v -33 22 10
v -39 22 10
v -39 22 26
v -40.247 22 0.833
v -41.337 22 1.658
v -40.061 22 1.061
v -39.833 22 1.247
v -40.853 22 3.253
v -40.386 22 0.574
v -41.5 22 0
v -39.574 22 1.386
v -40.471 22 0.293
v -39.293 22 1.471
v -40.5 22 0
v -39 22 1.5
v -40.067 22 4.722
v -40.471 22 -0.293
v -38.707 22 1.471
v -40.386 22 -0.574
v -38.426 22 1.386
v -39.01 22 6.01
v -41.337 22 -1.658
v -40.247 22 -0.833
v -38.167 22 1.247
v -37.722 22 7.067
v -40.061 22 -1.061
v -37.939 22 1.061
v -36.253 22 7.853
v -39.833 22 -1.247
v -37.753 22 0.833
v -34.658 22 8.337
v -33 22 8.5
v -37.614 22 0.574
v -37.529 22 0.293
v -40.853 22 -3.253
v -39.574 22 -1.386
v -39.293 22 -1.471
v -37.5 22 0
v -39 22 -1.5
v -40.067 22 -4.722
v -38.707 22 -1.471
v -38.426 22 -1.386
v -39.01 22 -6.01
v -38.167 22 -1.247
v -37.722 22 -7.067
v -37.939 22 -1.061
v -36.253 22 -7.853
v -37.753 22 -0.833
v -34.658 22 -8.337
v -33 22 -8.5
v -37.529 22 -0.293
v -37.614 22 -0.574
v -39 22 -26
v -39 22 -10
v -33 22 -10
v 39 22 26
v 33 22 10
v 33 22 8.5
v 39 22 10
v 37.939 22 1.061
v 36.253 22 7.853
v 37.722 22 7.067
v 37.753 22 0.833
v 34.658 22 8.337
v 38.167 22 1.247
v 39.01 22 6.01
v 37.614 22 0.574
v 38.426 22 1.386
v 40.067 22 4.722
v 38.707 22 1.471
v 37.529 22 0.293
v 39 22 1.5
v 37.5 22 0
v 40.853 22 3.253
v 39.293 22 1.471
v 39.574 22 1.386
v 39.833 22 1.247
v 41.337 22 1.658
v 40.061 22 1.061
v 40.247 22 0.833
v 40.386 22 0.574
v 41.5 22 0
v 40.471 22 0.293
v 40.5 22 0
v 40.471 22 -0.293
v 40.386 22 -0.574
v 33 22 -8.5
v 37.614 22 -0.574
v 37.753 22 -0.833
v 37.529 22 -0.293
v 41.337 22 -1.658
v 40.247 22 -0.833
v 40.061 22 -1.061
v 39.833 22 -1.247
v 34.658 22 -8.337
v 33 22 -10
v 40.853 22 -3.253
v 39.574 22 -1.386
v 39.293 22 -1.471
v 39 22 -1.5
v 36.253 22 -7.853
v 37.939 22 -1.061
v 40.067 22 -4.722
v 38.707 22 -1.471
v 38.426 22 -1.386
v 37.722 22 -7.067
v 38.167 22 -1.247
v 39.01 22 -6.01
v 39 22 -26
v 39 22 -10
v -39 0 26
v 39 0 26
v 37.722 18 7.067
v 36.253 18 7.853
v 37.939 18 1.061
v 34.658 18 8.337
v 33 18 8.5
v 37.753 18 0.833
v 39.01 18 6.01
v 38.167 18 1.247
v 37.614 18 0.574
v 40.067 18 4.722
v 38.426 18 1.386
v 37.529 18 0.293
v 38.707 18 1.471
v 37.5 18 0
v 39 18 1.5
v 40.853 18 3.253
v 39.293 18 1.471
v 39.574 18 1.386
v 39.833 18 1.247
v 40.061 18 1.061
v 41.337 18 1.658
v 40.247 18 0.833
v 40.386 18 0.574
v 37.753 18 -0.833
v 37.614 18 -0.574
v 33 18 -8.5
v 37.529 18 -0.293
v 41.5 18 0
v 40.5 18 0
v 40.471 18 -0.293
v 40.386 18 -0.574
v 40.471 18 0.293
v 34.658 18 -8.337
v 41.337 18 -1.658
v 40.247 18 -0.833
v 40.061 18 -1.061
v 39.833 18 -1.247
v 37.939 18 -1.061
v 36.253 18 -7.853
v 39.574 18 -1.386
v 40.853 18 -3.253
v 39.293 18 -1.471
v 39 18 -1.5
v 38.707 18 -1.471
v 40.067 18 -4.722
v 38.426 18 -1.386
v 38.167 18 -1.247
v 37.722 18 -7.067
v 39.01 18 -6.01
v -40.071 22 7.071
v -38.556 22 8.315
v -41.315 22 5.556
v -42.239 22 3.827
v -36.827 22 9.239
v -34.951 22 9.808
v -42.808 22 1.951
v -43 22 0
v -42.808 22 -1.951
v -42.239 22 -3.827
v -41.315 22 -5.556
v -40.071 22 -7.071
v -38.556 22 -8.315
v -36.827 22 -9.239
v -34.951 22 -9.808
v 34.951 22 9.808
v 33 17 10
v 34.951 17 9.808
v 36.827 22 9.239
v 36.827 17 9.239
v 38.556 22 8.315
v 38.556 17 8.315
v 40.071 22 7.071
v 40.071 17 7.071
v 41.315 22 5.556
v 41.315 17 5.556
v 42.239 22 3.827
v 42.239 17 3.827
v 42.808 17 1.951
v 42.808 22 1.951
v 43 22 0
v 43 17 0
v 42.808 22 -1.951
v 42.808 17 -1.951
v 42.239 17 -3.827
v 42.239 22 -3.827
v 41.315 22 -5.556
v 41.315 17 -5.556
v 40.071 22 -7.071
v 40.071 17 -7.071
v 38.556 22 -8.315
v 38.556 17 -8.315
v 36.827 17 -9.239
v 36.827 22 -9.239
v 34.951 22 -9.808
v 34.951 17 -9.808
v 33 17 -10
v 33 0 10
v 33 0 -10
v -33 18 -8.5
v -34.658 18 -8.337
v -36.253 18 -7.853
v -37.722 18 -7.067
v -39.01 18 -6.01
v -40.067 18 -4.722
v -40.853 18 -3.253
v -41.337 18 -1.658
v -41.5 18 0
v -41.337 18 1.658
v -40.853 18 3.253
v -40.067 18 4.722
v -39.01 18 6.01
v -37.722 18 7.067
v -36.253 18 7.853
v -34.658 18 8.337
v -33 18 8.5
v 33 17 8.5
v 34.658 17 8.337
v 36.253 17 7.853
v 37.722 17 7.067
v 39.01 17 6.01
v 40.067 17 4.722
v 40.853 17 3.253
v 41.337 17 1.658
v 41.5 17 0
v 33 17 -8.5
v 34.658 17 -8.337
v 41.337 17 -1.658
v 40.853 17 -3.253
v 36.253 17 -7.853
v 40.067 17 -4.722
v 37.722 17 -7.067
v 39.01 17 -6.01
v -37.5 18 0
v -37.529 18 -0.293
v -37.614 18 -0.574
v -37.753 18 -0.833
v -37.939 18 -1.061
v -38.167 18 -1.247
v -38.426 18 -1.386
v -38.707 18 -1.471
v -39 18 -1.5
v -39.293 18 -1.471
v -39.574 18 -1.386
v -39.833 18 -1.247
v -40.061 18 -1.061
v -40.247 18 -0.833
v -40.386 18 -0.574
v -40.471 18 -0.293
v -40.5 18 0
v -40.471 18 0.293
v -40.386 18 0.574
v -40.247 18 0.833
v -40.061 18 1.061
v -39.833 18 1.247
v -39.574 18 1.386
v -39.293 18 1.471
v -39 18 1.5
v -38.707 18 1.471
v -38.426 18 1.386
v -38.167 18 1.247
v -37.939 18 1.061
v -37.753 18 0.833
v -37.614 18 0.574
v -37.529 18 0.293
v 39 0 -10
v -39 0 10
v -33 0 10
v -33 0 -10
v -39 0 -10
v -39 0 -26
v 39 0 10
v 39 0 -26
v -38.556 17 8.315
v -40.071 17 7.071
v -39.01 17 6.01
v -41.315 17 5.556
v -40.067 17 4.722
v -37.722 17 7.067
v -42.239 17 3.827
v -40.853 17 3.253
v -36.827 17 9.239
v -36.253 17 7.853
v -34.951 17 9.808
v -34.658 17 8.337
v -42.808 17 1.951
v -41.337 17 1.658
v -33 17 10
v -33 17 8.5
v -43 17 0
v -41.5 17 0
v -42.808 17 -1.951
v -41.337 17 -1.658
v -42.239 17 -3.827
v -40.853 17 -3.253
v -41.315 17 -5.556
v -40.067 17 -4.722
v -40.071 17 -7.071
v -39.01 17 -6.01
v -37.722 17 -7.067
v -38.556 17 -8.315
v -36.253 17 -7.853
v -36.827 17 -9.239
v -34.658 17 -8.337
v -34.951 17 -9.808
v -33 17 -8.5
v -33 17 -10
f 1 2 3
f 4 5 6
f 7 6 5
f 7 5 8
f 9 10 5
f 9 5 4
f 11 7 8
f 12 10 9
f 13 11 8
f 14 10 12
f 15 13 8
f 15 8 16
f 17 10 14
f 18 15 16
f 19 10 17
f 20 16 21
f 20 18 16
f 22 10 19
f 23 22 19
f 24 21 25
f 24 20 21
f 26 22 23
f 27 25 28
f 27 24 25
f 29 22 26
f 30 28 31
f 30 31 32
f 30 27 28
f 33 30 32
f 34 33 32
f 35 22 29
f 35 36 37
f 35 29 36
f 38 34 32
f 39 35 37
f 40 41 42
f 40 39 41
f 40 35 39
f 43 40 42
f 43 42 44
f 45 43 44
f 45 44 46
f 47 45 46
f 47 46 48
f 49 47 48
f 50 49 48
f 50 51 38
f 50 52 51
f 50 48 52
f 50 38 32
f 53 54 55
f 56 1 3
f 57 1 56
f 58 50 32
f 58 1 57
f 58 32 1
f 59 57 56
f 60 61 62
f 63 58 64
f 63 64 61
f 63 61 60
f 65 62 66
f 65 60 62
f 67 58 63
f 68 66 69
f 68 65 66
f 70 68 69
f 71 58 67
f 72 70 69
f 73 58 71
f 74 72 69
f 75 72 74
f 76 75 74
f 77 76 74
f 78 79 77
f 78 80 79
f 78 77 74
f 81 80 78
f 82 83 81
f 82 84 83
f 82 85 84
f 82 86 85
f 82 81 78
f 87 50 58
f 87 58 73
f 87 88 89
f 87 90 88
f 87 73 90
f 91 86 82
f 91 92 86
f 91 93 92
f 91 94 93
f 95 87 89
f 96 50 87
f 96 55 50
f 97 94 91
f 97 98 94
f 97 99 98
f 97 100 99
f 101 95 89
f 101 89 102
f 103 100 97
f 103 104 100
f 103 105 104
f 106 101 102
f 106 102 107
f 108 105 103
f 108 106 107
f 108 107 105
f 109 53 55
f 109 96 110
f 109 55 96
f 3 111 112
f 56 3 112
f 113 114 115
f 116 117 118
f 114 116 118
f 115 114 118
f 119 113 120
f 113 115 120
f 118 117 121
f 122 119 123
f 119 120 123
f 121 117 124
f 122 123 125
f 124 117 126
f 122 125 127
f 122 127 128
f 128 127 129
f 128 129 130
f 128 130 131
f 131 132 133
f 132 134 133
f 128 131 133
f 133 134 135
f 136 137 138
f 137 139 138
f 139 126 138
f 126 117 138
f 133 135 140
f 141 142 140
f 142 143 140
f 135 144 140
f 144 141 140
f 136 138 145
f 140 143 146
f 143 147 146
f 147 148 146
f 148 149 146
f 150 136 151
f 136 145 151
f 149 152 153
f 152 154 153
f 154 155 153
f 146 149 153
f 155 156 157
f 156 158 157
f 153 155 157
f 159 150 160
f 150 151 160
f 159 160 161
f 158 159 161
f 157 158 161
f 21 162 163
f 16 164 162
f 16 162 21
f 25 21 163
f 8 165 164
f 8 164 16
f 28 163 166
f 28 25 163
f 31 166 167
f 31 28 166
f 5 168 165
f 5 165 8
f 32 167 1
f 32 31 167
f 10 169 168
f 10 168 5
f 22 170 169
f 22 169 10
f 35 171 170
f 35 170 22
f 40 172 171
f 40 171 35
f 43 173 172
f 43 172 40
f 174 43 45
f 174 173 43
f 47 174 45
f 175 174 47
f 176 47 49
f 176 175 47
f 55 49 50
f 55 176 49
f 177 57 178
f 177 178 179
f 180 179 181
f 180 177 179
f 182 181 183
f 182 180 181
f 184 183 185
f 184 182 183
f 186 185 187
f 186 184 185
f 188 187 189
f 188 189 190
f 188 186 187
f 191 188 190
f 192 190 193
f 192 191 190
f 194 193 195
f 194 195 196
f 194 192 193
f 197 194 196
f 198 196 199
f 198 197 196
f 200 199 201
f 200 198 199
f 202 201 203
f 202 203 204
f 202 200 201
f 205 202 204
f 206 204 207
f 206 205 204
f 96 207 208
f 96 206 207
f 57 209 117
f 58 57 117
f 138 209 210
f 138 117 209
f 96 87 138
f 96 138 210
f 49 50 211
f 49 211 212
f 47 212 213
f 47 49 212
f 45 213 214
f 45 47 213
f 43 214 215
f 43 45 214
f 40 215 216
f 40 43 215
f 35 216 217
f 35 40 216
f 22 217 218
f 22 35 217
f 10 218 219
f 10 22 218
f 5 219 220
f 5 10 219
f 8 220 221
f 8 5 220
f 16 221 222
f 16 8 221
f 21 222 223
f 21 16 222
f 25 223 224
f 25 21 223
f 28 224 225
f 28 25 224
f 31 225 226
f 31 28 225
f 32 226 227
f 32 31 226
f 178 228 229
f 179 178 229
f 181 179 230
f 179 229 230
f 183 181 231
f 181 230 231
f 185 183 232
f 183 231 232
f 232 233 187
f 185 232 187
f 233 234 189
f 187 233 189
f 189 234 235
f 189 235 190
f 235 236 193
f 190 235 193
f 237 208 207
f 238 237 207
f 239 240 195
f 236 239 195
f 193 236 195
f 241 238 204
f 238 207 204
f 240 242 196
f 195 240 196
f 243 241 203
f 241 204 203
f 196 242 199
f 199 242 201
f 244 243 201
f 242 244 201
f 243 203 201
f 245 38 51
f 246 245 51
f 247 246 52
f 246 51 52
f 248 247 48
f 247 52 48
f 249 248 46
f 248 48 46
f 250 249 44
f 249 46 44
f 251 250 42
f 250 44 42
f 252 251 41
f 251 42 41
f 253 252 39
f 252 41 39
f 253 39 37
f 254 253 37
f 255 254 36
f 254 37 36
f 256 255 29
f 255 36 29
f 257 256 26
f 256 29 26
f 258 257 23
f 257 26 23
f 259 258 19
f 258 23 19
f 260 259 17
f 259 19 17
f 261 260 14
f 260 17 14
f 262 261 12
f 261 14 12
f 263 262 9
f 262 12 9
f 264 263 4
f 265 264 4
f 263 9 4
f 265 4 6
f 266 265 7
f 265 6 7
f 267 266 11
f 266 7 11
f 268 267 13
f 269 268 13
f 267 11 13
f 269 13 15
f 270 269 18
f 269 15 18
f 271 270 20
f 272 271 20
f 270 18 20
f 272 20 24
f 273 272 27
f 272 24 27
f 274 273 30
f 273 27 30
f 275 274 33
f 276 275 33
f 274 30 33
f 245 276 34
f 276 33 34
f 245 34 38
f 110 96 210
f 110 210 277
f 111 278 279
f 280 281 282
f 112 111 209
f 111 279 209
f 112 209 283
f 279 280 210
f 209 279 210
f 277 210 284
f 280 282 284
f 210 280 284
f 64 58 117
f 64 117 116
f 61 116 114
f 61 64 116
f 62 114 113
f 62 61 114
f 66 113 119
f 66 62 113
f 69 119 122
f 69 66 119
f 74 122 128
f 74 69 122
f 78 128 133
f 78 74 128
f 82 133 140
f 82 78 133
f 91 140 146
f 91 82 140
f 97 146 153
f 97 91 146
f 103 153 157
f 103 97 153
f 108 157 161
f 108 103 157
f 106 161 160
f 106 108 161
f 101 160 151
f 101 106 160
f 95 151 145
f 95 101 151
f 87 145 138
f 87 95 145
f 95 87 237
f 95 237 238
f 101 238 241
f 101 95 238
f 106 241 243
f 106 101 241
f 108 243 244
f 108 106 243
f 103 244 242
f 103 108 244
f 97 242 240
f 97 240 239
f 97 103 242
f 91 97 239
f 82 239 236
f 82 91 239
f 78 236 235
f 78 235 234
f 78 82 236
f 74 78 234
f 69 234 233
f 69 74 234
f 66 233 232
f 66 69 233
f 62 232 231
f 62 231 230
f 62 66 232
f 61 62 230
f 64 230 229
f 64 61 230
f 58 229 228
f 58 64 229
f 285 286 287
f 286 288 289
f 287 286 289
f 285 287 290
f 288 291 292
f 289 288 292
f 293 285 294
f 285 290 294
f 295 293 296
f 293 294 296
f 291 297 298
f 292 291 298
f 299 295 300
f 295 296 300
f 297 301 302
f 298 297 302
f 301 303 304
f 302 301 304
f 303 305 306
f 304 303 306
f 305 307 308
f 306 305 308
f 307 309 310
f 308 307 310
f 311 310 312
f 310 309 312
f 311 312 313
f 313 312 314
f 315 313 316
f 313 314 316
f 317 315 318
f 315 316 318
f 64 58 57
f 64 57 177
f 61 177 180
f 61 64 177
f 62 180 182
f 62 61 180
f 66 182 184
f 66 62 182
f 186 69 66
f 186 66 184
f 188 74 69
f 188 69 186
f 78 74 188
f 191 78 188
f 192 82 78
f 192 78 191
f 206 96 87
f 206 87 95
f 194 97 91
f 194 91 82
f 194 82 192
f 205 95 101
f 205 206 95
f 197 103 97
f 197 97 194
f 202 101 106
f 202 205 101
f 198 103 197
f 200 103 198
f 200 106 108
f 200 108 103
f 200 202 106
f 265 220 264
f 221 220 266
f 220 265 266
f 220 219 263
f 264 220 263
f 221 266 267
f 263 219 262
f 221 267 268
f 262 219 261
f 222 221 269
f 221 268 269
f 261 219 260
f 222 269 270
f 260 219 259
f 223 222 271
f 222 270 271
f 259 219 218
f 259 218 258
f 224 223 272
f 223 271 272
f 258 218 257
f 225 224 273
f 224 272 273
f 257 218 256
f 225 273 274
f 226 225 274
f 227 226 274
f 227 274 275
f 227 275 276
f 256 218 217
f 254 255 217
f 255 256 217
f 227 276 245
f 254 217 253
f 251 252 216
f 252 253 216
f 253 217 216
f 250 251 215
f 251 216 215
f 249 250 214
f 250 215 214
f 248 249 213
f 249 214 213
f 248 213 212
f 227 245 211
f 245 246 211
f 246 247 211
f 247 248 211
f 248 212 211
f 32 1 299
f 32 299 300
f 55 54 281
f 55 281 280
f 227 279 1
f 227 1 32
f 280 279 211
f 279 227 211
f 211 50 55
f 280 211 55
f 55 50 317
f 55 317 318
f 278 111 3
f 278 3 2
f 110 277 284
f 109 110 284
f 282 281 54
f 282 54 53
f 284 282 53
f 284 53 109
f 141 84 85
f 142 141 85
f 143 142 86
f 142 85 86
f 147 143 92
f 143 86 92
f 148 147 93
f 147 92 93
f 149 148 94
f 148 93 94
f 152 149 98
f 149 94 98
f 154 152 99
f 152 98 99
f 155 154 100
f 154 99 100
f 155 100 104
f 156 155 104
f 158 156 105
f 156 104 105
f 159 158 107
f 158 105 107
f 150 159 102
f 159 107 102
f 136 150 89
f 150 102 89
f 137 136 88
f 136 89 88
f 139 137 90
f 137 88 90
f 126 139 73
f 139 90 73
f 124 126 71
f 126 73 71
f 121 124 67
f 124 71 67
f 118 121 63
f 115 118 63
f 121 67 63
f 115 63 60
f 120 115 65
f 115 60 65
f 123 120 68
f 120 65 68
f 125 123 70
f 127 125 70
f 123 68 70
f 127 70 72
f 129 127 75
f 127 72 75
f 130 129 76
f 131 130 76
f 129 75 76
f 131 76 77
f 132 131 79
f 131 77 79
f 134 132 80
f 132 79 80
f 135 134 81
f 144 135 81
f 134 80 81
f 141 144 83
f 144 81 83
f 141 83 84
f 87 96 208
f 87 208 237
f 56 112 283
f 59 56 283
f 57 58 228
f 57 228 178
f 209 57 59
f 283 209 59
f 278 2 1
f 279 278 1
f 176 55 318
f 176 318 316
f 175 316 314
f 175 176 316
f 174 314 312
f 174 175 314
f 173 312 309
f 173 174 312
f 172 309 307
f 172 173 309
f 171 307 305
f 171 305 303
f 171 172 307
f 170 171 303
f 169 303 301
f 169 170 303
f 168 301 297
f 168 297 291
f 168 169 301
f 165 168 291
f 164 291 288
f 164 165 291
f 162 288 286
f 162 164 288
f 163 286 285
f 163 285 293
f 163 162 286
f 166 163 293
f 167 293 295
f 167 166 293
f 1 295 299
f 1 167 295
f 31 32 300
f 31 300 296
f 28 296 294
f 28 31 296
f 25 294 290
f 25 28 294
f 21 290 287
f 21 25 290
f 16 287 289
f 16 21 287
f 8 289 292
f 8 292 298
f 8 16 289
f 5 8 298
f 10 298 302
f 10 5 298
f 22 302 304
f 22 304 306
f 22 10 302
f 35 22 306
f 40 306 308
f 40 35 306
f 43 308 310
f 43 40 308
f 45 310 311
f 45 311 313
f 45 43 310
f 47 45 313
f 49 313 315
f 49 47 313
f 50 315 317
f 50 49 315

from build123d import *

# Parameters (mm, degrees)
SCHIZZO1_W                     = 78
SCHIZZO1_H                     = 52
ESTRUSIONE_ESTRUSIONE1_DEPTH   = 22
SCHIZZO3_W                     = 6
SCHIZZO3_H                     = 20
TAGLIO_ESTRUSIONE1_DEPTH       = 52.778373864
SCHIZZO4_R                     = 1.5
ESTRUSIONE_ESTRUSIONE2_DEPTH   = 4
ESTRUSIONE_ESTRUSIONE3_DEPTH   = 5
ESTRUSIONE_ESTRUSIONE3_2_DEPTH = 5


with BuildPart() as part:
    # Schizzo1 → Estrusione-Estrusione1 (new body)
    with BuildSketch(Plane(origin=(0, 0, 0), x_dir=(1, 0, 0), z_dir=(0, 1, 0))):
        Rectangle(SCHIZZO1_W, SCHIZZO1_H)
    extrude(amount=ESTRUSIONE_ESTRUSIONE1_DEPTH)

    # Schizzo3 → Taglio-Estrusione1 (cut, through all)
    with BuildSketch(Plane(origin=(0, 22, 0), x_dir=(1, 0, 0), z_dir=(0, 1, 0))):
        with Locations((-36, 0)):
            Rectangle(SCHIZZO3_W, SCHIZZO3_H)
        with Locations((36, 0)):
            Rectangle(SCHIZZO3_W, SCHIZZO3_H)
    extrude(amount=-TAGLIO_ESTRUSIONE1_DEPTH, mode=Mode.SUBTRACT)

    # Schizzo4 → Estrusione-Estrusione2 (add)
    # profile 1 of 2: a face of its own
    with BuildSketch(Plane(origin=(0, 22, 0), x_dir=(1, 0, 0), z_dir=(0, 1, 0))):
        with BuildLine():
            Line((-33, -8.5), (-33, 8.5))
            ThreePointArc((-33, 8.5), (-41.5, 0), (-33, -8.5))
        make_face()
        with Locations((-39, 0)):
            Circle(SCHIZZO4_R, mode=Mode.SUBTRACT)
    # profile 2 of 2: a face of its own
    with BuildSketch(Plane(origin=(0, 22, 0), x_dir=(1, 0, 0), z_dir=(0, 1, 0))):
        with BuildLine():
            ThreePointArc((33, -8.5), (41.5, 0), (33, 8.5))
            Line((33, 8.5), (33, -8.5))
        make_face()
        with Locations((39, 0)):
            Circle(SCHIZZO4_R, mode=Mode.SUBTRACT)
    extrude(amount=-ESTRUSIONE_ESTRUSIONE2_DEPTH)


with BuildPart() as body_2:
    # Schizzo4<3> → Estrusione-Estrusione3 (new body)
    with BuildSketch(Plane(origin=(0, 22, 0), x_dir=(1, 0, 0), z_dir=(0, 1, 0))):
        with BuildLine():
            Line((-33, 8.5), (-33, 10))
            ThreePointArc((-33, 10), (-43, 0), (-33, -10))
            Line((-33, -10), (-33, -8.5))
            ThreePointArc((-33, -8.5), (-41.5, 0), (-33, 8.5))
        make_face()
    extrude(amount=-ESTRUSIONE_ESTRUSIONE3_DEPTH)


with BuildPart() as body_3:
    # Schizzo4<3> → Estrusione-Estrusione3 2 (new body)
    with BuildSketch(Plane(origin=(0, 22, 0), x_dir=(1, 0, 0), z_dir=(0, 1, 0))):
        with BuildLine():
            Line((33, 10), (33, 8.5))
            ThreePointArc((33, 8.5), (41.5, 0), (33, -8.5))
            Line((33, -8.5), (33, -10))
            ThreePointArc((33, -10), (43, 0), (33, 10))
        make_face()
    extrude(amount=-ESTRUSIONE_ESTRUSIONE3_2_DEPTH)


solid = Compound([part.part, body_2.part, body_3.part])
